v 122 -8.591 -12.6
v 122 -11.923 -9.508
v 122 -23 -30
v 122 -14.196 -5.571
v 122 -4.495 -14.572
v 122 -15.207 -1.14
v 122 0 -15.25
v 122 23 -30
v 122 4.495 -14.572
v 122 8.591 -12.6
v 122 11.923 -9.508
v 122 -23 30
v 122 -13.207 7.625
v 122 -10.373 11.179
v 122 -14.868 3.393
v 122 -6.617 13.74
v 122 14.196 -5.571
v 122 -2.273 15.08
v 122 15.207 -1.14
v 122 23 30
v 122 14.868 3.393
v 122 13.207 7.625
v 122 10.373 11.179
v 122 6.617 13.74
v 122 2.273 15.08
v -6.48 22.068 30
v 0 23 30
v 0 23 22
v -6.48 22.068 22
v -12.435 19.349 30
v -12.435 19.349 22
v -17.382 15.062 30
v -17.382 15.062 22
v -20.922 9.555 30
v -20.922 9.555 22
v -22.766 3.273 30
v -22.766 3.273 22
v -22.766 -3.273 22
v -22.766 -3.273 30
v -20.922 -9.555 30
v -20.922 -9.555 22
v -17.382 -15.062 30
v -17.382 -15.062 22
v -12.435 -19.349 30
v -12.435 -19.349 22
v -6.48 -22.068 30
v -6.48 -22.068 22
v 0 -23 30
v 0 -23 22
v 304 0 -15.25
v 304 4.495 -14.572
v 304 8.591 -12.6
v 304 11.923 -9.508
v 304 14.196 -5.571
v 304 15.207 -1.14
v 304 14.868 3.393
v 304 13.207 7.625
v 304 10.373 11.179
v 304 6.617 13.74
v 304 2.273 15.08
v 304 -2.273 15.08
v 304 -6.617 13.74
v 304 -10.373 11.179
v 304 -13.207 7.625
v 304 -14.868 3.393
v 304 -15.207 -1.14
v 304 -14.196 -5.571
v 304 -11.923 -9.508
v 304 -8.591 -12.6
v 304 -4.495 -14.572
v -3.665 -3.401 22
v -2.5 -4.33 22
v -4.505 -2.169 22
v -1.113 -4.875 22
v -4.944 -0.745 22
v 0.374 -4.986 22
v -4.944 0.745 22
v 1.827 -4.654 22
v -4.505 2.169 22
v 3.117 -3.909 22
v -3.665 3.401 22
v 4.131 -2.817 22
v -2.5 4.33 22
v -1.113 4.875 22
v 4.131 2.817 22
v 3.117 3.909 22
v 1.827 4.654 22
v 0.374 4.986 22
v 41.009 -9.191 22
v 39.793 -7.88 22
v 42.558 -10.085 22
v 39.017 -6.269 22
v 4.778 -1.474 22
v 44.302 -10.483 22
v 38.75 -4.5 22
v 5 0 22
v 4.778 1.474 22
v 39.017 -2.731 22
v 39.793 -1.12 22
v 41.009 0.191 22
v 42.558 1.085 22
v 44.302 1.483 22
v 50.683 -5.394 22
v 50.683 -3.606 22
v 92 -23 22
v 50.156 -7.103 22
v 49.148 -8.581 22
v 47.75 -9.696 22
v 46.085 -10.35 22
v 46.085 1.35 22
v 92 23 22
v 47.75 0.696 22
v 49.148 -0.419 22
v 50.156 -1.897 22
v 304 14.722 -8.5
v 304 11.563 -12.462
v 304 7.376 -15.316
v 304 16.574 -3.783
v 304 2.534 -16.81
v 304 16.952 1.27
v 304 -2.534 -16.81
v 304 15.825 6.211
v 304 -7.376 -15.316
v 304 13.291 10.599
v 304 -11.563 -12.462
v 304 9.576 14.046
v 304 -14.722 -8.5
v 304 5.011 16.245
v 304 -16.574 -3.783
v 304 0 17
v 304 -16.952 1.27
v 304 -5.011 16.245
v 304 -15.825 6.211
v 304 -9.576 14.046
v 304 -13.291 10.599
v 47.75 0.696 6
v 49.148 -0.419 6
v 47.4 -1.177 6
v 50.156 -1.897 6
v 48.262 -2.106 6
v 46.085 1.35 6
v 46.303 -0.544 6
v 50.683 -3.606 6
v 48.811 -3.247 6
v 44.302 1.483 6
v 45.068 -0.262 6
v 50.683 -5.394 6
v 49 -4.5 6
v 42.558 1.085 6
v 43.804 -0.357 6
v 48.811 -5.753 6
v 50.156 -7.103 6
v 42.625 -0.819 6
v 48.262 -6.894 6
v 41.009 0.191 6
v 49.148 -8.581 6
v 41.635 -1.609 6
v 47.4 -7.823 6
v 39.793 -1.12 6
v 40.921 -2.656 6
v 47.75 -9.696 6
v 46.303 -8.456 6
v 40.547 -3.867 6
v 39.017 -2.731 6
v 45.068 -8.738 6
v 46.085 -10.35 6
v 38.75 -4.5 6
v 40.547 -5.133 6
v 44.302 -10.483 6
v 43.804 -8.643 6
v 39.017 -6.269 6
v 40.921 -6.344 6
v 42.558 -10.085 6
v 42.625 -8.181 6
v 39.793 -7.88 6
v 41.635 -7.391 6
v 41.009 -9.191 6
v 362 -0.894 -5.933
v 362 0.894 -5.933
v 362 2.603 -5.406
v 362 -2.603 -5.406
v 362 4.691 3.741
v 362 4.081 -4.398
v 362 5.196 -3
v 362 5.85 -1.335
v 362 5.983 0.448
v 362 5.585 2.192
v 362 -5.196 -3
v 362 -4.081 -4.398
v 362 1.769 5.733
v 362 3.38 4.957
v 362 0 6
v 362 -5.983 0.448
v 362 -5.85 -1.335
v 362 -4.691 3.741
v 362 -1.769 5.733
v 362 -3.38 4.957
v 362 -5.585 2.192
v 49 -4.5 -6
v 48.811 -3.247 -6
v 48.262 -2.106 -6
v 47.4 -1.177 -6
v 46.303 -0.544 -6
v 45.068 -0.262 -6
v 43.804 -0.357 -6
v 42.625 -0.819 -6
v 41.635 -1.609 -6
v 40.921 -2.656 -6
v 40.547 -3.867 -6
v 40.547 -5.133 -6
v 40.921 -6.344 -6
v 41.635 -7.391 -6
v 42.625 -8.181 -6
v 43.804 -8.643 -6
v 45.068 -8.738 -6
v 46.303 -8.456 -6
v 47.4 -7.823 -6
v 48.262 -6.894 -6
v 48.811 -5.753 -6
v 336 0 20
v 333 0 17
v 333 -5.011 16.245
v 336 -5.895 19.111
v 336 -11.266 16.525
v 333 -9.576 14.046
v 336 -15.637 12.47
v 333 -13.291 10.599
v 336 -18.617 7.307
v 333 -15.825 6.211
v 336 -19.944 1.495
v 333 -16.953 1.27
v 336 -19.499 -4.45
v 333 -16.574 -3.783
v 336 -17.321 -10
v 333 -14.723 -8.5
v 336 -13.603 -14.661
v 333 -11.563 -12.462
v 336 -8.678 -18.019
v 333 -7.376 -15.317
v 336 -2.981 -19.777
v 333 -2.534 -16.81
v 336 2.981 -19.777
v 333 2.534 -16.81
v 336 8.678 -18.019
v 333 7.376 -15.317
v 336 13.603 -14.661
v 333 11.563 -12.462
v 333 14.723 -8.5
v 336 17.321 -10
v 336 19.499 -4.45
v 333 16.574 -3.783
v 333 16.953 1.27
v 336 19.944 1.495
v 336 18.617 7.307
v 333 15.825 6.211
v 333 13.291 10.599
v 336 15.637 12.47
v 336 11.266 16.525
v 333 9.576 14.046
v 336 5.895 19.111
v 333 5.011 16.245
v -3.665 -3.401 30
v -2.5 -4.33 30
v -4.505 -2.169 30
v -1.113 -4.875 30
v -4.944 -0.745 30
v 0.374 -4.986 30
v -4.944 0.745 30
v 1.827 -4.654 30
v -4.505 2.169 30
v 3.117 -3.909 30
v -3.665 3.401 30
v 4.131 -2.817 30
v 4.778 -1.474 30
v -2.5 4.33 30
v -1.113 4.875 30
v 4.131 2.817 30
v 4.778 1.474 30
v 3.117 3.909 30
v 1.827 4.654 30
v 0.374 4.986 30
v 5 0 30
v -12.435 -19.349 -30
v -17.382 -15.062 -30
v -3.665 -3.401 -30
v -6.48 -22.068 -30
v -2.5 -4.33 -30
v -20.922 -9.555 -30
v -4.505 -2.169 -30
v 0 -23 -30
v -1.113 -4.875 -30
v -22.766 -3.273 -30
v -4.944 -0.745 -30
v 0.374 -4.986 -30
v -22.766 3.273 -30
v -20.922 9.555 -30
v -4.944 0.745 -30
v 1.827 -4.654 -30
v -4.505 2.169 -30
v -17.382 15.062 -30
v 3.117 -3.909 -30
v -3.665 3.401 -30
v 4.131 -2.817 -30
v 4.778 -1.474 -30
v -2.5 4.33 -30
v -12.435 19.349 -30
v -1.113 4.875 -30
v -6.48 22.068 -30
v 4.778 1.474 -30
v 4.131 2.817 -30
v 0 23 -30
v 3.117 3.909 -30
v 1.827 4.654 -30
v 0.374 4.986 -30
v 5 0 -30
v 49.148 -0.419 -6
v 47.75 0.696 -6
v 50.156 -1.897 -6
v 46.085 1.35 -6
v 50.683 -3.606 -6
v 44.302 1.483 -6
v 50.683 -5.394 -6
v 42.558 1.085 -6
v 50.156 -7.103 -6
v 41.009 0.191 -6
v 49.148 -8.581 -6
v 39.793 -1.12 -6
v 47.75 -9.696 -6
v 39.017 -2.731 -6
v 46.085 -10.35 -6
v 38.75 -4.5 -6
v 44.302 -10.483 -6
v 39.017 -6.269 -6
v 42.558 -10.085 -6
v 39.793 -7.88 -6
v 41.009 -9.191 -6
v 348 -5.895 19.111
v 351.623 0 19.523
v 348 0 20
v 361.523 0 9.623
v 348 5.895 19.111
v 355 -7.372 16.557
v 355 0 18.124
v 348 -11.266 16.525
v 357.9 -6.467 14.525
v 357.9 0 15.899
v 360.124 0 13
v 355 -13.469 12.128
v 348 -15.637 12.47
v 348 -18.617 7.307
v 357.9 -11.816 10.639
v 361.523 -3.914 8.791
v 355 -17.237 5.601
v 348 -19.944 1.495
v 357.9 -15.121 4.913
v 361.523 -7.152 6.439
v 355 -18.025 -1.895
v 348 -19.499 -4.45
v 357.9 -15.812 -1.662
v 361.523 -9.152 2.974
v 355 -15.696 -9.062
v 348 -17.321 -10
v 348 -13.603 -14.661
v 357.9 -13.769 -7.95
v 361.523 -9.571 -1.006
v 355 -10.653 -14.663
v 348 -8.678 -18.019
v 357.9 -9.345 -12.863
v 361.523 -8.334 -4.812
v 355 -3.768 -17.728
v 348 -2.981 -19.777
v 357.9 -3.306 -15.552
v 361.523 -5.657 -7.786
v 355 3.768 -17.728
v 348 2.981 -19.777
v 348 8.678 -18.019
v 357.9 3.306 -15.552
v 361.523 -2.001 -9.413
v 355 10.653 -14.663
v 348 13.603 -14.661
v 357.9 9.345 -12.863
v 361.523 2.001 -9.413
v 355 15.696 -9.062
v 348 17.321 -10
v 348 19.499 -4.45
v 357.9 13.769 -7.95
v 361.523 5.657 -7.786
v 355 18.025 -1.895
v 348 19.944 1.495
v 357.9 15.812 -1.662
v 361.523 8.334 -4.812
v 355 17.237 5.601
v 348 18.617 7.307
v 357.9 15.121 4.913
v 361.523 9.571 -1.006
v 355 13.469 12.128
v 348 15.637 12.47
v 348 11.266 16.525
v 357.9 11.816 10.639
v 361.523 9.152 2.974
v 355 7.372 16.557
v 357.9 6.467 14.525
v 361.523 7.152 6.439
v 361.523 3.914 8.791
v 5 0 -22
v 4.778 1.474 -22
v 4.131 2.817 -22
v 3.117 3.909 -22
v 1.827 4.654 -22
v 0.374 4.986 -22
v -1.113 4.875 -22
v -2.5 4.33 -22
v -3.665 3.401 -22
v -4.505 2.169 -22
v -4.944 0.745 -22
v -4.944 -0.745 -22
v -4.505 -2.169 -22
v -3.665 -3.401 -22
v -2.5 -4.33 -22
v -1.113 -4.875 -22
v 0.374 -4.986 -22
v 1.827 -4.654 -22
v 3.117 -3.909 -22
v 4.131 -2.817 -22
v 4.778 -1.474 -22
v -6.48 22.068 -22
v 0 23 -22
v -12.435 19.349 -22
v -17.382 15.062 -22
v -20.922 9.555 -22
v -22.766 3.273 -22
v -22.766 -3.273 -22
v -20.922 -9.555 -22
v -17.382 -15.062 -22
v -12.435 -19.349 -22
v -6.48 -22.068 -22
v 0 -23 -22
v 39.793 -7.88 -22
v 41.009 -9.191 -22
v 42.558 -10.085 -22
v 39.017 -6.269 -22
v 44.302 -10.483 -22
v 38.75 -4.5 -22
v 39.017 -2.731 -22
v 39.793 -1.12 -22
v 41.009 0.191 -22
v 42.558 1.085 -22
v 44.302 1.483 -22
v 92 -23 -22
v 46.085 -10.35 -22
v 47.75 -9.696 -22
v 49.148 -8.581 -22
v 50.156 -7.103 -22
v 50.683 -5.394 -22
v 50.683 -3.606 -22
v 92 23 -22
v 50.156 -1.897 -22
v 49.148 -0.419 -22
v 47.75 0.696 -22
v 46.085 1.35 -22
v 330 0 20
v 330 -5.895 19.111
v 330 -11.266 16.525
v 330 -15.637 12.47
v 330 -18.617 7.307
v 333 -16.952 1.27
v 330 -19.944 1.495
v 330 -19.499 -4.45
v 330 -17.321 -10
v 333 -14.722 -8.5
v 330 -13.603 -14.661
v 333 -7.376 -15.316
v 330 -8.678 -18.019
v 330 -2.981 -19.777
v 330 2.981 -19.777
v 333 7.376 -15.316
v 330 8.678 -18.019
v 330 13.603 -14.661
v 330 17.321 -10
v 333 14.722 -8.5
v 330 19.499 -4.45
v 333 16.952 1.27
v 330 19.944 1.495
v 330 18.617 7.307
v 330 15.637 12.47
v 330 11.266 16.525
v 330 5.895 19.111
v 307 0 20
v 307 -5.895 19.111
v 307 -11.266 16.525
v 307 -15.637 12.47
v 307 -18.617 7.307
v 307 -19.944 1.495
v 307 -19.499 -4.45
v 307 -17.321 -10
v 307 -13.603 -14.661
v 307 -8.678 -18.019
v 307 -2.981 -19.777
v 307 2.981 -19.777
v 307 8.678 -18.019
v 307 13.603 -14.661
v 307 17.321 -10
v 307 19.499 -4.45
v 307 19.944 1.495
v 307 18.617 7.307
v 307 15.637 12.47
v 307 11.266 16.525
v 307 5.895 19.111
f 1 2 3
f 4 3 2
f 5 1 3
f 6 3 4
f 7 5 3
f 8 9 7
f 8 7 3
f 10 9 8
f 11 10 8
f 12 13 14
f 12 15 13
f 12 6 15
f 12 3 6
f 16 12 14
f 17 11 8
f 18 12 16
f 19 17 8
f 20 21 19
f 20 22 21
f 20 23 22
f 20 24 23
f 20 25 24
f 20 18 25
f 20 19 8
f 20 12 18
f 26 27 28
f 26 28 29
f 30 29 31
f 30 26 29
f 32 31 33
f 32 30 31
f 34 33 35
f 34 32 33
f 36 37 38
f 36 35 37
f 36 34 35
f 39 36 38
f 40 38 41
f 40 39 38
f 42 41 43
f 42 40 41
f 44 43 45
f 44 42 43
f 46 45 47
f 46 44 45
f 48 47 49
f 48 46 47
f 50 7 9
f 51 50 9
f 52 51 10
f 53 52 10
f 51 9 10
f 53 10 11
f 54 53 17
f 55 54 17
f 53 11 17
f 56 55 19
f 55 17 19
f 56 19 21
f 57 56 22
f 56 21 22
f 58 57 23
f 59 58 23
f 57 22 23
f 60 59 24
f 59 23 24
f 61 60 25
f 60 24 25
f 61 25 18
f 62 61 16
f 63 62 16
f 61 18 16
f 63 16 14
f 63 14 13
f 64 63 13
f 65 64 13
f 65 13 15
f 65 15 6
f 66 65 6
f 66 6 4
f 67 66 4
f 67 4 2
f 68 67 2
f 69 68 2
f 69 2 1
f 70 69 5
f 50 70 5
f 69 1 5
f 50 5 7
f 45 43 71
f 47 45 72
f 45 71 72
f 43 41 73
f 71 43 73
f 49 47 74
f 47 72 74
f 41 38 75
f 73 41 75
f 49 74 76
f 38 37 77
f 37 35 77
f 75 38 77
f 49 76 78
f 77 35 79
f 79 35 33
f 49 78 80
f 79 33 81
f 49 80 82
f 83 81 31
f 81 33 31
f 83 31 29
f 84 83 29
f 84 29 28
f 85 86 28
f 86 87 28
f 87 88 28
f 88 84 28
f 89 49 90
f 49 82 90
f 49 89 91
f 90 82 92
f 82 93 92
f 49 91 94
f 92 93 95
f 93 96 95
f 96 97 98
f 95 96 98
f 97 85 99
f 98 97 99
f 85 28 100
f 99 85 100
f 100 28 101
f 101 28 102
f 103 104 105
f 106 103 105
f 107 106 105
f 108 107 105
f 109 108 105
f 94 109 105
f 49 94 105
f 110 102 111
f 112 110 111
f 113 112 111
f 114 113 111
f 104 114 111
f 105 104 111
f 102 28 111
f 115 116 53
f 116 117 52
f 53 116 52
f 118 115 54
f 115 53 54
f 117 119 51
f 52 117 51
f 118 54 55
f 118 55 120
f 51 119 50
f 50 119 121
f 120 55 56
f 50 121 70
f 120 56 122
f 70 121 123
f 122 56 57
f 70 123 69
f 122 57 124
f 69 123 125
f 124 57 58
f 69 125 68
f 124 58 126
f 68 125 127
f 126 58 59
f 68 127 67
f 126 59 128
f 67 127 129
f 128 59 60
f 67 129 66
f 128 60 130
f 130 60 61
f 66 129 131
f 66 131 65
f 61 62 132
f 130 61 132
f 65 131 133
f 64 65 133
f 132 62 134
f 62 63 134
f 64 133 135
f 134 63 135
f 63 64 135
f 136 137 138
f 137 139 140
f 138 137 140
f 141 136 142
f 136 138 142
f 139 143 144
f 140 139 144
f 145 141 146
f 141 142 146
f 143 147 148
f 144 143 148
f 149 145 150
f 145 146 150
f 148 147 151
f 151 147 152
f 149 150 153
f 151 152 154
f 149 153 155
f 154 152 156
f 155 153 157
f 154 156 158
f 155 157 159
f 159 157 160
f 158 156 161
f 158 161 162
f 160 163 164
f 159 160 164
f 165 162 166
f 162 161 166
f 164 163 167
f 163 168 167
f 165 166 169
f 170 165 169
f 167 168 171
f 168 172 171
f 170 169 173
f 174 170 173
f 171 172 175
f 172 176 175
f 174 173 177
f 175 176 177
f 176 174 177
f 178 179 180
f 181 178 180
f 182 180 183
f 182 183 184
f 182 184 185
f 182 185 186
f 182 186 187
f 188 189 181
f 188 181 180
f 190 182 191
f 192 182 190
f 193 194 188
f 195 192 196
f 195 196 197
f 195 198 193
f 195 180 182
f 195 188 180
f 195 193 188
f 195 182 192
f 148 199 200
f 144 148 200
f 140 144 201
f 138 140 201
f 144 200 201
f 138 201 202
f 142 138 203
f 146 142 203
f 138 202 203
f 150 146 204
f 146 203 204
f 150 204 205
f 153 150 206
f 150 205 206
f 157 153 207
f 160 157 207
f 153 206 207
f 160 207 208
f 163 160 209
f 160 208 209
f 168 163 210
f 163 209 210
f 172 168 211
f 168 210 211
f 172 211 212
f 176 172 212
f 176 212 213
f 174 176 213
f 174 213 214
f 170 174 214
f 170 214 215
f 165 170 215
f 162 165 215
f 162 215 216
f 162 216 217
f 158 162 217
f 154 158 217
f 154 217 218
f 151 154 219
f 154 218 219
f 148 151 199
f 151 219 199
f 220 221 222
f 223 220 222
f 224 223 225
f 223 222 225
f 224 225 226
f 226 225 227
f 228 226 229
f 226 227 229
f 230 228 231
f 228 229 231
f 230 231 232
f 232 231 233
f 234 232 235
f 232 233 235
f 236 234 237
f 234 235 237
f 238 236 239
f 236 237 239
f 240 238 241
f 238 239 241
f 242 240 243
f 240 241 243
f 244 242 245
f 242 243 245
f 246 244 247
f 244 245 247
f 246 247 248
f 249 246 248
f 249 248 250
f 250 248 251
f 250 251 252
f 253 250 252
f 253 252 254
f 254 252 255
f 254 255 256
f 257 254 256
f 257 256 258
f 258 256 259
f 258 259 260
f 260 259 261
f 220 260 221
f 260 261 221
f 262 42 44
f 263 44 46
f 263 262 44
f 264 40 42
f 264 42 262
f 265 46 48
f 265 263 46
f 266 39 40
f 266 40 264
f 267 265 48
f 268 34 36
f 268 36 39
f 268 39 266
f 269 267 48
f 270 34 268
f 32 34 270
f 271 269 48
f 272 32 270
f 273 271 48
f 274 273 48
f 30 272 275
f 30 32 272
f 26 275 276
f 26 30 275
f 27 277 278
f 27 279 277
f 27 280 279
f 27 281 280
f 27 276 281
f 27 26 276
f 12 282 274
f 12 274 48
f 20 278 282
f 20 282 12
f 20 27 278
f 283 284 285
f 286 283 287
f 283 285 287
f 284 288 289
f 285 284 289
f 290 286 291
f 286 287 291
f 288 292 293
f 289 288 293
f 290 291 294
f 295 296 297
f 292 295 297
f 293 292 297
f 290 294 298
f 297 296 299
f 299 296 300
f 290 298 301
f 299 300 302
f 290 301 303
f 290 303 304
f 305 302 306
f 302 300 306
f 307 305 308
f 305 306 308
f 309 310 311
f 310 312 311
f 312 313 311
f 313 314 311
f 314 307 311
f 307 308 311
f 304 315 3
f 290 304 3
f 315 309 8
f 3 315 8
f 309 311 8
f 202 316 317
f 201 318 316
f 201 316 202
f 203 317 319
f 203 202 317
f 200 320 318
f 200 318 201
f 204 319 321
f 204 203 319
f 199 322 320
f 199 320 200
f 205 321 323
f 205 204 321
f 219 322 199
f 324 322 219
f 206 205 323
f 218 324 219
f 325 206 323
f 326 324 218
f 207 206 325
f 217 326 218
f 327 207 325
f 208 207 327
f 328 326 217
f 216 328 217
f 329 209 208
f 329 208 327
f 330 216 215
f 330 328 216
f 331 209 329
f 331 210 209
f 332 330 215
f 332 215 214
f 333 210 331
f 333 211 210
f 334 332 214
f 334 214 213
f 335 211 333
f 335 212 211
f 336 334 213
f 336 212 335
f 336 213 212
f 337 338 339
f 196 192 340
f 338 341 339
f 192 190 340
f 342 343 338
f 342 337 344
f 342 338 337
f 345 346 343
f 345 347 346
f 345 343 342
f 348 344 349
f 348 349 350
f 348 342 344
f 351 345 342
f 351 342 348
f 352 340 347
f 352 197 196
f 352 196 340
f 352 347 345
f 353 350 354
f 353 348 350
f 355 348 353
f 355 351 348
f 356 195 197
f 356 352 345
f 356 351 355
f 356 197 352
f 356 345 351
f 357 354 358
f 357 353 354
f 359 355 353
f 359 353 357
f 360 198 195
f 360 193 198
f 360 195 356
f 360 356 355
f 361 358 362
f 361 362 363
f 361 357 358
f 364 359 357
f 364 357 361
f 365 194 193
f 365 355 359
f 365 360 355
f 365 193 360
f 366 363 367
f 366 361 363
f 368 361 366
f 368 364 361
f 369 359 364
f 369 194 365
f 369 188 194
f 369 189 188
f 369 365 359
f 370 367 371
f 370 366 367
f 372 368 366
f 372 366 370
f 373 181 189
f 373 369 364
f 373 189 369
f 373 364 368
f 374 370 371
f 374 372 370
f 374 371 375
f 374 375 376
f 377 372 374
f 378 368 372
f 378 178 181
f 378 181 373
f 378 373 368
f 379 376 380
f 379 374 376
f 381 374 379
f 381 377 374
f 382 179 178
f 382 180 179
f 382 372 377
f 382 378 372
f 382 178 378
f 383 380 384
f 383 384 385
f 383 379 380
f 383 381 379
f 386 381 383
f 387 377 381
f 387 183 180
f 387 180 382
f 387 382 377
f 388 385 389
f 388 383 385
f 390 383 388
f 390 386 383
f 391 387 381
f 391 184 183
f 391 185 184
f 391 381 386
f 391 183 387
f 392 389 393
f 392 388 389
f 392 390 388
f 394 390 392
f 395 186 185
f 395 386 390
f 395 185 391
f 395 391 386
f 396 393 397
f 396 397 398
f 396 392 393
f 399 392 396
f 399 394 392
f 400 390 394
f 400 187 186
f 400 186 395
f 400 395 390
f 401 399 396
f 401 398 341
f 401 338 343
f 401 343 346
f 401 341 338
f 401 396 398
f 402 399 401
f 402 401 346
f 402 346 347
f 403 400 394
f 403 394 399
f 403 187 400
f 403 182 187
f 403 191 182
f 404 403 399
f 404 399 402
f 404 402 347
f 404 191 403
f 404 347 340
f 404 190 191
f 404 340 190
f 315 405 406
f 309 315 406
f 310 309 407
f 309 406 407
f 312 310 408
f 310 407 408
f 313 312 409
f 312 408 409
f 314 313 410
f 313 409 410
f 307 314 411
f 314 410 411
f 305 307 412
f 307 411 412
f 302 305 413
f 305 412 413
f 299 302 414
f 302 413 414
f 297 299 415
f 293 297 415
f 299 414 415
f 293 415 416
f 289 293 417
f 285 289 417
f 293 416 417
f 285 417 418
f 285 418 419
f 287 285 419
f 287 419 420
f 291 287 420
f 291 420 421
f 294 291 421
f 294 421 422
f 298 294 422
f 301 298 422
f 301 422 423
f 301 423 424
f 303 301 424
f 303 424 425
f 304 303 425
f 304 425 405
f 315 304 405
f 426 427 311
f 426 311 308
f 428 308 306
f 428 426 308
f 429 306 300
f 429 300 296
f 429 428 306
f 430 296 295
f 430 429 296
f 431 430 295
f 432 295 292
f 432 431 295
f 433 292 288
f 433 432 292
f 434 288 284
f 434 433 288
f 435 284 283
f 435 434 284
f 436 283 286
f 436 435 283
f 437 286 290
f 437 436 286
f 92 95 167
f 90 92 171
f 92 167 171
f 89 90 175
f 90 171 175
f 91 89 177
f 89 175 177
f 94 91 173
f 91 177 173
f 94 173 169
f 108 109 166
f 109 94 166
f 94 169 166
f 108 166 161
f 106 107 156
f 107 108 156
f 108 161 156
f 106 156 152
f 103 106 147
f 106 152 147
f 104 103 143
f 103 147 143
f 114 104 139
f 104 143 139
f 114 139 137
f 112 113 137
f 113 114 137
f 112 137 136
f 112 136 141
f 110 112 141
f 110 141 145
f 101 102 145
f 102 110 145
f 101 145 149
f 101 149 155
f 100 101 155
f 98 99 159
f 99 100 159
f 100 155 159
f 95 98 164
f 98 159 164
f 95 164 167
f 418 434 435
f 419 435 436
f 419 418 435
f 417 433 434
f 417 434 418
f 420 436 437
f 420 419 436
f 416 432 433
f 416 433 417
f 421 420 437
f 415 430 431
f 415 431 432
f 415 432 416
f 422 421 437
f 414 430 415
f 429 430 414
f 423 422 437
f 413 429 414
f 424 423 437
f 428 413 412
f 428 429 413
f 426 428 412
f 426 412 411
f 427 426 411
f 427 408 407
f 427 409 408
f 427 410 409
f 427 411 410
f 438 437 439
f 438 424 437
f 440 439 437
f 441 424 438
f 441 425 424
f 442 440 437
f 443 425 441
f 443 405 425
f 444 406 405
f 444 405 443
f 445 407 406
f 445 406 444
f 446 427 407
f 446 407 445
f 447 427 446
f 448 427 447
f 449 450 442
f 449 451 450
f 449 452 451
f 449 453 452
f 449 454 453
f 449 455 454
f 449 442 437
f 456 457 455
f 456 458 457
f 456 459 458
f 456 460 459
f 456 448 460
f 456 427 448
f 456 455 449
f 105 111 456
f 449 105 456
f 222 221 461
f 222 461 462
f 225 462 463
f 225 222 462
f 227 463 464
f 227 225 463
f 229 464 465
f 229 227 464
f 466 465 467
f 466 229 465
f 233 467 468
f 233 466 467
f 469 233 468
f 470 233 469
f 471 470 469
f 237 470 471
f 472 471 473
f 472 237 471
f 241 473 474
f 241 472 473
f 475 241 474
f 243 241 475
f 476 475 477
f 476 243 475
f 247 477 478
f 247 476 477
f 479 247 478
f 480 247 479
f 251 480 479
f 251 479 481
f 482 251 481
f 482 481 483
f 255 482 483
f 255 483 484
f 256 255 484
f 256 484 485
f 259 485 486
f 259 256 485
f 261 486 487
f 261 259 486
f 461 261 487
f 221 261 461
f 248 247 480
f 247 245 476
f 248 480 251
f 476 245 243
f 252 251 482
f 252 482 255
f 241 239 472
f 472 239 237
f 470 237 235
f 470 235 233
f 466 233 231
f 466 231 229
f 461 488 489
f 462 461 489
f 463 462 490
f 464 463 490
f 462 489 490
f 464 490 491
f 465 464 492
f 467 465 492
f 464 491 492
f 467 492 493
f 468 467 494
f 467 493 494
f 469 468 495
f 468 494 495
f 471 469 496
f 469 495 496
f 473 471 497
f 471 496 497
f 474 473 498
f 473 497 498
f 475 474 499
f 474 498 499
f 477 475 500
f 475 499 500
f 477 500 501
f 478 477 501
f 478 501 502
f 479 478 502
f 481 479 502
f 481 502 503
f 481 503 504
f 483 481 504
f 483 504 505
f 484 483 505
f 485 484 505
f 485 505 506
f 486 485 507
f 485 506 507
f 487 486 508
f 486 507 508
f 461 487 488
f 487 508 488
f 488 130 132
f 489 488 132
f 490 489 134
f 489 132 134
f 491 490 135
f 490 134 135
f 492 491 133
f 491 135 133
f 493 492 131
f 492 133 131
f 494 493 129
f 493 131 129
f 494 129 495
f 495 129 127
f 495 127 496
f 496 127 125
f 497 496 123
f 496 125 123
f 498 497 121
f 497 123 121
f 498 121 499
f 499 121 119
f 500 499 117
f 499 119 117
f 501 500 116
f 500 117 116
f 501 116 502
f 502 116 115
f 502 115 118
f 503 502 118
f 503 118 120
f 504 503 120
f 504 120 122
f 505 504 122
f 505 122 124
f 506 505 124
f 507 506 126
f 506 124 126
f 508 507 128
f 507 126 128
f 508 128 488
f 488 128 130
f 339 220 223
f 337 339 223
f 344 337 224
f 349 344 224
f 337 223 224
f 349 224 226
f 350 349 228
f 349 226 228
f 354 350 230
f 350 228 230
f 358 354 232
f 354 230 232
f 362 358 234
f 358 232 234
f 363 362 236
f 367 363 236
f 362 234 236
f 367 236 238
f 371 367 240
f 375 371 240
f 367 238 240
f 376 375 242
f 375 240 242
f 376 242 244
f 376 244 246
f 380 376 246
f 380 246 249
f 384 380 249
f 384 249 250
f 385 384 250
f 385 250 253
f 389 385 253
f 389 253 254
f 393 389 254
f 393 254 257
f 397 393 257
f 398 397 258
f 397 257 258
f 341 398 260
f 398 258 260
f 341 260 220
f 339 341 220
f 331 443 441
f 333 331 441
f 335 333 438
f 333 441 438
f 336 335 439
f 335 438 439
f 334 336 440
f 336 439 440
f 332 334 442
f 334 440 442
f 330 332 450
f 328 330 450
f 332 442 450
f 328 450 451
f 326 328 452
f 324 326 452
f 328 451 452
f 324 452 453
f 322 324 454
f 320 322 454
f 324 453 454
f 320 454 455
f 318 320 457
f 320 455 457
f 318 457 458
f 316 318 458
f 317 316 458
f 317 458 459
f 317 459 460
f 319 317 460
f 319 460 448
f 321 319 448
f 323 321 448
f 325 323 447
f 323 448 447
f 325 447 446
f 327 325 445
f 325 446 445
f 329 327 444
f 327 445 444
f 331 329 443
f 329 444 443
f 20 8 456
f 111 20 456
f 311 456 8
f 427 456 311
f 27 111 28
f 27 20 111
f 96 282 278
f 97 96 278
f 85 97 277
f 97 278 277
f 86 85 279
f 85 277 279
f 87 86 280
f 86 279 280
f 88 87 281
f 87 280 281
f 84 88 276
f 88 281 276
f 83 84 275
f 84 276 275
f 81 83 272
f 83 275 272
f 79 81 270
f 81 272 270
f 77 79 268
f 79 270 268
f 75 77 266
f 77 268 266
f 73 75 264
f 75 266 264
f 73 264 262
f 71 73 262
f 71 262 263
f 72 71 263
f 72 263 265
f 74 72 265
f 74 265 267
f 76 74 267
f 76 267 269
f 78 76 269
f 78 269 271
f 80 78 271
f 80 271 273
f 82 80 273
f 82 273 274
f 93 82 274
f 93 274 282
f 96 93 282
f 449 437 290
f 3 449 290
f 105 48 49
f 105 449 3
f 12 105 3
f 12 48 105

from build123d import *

# Parameters (mm, degrees)
SALIENTE_EXTRUIR1_DEPTH = 60
CORTAR_EXTRUIR1_REACH   = 135.791
CROQUIS3_W              = 115.000008821
CROQUIS3_H              = 44
CROQUIS6_R              = 6
SALIENTE_EXTRUIR4_DEPTH = 16
CROQUIS7_R              = 4.25
SALIENTE_EXTRUIR5_DEPTH = 12
SALIENTE_EXTRUIR6_REACH = 131.263
CROQUIS8_R              = 6
CROQUIS9_R              = 15.25
SALIENTE_EXTRUIR7_DEPTH = 182
CROQUIS10_R             = 20
SALIENTE_EXTRUIR8_DEPTH = 29
CHAFL_N1_SIZE           = 3
CHAFL_N2_SIZE           = 3
CROQUIS11_R             = 20
SALIENTE_EXTRUIR9_DEPTH = 29
CHAFL_N3_SIZE           = 3
REDONDEO1_R             = 14
CROQUIS12_R             = 5
CORTAR_EXTRUIR2_DEPTH   = 368.658817909


with BuildPart() as part:
    # Croquis1 → Saliente-Extruir1 (new body)
    with BuildSketch(Plane.XY.offset(30)):
        with BuildLine():
            Line((122.000008821, -23), (122.000008821, 23))
            Line((122.000008821, 23), (0, 23))
            ThreePointArc((0, 23), (-23, 0), (0, -23))
            Line((0, -23), (122.000008821, -23))
        make_face()
    extrude(amount=-SALIENTE_EXTRUIR1_DEPTH)

    # Croquis3 → Cortar-Extruir1 (cut, up to next)
    with BuildSketch(Plane(origin=(0, 23, 0), x_dir=(1, 0, 0), z_dir=(0, 1, 0)), mode=Mode.PRIVATE) as cortar_extruir1_sk1:
        with Locations((34.500004411, 0)):
            Rectangle(CROQUIS3_W, CROQUIS3_H)
    cortar_extruir1_tool1 = extrude(cortar_extruir1_sk1.sketch, amount=-CORTAR_EXTRUIR1_REACH, mode=Mode.PRIVATE) & part.part
    add(cortar_extruir1_tool1.solids().sort_by_distance((34.500004, 23, 0))[0], mode=Mode.SUBTRACT)

    # Croquis6 → Saliente-Extruir4 (add)
    with BuildSketch(Plane.XY.offset(-22)):
        with Locations(Location((44.750008821, -4.5, 0), (0, 0, 180))):
            Circle(CROQUIS6_R)
    extrude(amount=SALIENTE_EXTRUIR4_DEPTH)

    # Croquis7 → Saliente-Extruir5 (add)
    with BuildSketch(Plane.XY.offset(-6)):
        with Locations((44.750008821, -4.5)):
            Circle(CROQUIS7_R)
    extrude(amount=SALIENTE_EXTRUIR5_DEPTH)

    # Croquis8 → Saliente-Extruir6 (add, up to next)
    with BuildSketch(Plane.XY.offset(6), mode=Mode.PRIVATE) as saliente_extruir6_sk1:
        with Locations(Location((44.750008821, -4.5, 0), (0, 0, 180))):
            Circle(CROQUIS8_R)
    saliente_extruir6_tool1 = extrude(saliente_extruir6_sk1.sketch, amount=SALIENTE_EXTRUIR6_REACH, mode=Mode.PRIVATE) - part.part
    add(saliente_extruir6_tool1.solids().sort_by_distance((44.750009, -4.5, 6))[0])

    # Croquis9 → Saliente-Extruir7 (add)
    with BuildSketch(Plane(origin=(122.000008821, 0, 0), x_dir=(0, 0, -1), z_dir=(1, 0, 0))):
        Circle(CROQUIS9_R)
    extrude(amount=SALIENTE_EXTRUIR7_DEPTH)

    # Croquis10 → Saliente-Extruir8 (add)
    with BuildSketch(Plane(origin=(304.000008821, 0, 0), x_dir=(0, 0, -1), z_dir=(1, 0, 0))):
        with Locations(Location((0, 0, 0), (0, 0, 180))):
            Circle(CROQUIS10_R)
    extrude(amount=SALIENTE_EXTRUIR8_DEPTH)

    # Chaflán1
    chafl_n1_edges = [part.edges().sort_by_distance(p)[0] for p in [
        (304.000008821, 0, -20),
    ]]
    chamfer(chafl_n1_edges, length=CHAFL_N1_SIZE)

    # Chaflán2
    chafl_n2_edges = [part.edges().sort_by_distance(p)[0] for p in [
        (333.000008821, 0, -20),
    ]]
    chamfer(chafl_n2_edges, length=CHAFL_N2_SIZE)

    # Croquis11 → Saliente-Extruir9 (add)
    with BuildSketch(Plane(origin=(333.000008821, 0, 0), x_dir=(0, 0, -1), z_dir=(1, 0, 0))):
        with Locations(Location((0, 0, 0), (0, 0, 180))):
            Circle(CROQUIS11_R)
    extrude(amount=SALIENTE_EXTRUIR9_DEPTH)

    # Chaflán3
    chafl_n3_edges = [part.edges().sort_by_distance(p)[0] for p in [
        (333.000008821, 0, -20),
    ]]
    chamfer(chafl_n3_edges, length=CHAFL_N3_SIZE - 0.0001)  # a hair under: the kernel refuses the full size

    # Redondeo1
    redondeo1_edges = [part.edges().sort_by_distance(p)[0] for p in [
        (362.000008821, 0, -20),
    ]]
    fillet(redondeo1_edges, radius=REDONDEO1_R)

    # Croquis12 → Cortar-Extruir2 (cut, through all)
    with BuildSketch(Plane.XY.offset(30)):
        Circle(CROQUIS12_R)
    extrude(amount=-CORTAR_EXTRUIR2_DEPTH, mode=Mode.SUBTRACT)


solid = part.part
